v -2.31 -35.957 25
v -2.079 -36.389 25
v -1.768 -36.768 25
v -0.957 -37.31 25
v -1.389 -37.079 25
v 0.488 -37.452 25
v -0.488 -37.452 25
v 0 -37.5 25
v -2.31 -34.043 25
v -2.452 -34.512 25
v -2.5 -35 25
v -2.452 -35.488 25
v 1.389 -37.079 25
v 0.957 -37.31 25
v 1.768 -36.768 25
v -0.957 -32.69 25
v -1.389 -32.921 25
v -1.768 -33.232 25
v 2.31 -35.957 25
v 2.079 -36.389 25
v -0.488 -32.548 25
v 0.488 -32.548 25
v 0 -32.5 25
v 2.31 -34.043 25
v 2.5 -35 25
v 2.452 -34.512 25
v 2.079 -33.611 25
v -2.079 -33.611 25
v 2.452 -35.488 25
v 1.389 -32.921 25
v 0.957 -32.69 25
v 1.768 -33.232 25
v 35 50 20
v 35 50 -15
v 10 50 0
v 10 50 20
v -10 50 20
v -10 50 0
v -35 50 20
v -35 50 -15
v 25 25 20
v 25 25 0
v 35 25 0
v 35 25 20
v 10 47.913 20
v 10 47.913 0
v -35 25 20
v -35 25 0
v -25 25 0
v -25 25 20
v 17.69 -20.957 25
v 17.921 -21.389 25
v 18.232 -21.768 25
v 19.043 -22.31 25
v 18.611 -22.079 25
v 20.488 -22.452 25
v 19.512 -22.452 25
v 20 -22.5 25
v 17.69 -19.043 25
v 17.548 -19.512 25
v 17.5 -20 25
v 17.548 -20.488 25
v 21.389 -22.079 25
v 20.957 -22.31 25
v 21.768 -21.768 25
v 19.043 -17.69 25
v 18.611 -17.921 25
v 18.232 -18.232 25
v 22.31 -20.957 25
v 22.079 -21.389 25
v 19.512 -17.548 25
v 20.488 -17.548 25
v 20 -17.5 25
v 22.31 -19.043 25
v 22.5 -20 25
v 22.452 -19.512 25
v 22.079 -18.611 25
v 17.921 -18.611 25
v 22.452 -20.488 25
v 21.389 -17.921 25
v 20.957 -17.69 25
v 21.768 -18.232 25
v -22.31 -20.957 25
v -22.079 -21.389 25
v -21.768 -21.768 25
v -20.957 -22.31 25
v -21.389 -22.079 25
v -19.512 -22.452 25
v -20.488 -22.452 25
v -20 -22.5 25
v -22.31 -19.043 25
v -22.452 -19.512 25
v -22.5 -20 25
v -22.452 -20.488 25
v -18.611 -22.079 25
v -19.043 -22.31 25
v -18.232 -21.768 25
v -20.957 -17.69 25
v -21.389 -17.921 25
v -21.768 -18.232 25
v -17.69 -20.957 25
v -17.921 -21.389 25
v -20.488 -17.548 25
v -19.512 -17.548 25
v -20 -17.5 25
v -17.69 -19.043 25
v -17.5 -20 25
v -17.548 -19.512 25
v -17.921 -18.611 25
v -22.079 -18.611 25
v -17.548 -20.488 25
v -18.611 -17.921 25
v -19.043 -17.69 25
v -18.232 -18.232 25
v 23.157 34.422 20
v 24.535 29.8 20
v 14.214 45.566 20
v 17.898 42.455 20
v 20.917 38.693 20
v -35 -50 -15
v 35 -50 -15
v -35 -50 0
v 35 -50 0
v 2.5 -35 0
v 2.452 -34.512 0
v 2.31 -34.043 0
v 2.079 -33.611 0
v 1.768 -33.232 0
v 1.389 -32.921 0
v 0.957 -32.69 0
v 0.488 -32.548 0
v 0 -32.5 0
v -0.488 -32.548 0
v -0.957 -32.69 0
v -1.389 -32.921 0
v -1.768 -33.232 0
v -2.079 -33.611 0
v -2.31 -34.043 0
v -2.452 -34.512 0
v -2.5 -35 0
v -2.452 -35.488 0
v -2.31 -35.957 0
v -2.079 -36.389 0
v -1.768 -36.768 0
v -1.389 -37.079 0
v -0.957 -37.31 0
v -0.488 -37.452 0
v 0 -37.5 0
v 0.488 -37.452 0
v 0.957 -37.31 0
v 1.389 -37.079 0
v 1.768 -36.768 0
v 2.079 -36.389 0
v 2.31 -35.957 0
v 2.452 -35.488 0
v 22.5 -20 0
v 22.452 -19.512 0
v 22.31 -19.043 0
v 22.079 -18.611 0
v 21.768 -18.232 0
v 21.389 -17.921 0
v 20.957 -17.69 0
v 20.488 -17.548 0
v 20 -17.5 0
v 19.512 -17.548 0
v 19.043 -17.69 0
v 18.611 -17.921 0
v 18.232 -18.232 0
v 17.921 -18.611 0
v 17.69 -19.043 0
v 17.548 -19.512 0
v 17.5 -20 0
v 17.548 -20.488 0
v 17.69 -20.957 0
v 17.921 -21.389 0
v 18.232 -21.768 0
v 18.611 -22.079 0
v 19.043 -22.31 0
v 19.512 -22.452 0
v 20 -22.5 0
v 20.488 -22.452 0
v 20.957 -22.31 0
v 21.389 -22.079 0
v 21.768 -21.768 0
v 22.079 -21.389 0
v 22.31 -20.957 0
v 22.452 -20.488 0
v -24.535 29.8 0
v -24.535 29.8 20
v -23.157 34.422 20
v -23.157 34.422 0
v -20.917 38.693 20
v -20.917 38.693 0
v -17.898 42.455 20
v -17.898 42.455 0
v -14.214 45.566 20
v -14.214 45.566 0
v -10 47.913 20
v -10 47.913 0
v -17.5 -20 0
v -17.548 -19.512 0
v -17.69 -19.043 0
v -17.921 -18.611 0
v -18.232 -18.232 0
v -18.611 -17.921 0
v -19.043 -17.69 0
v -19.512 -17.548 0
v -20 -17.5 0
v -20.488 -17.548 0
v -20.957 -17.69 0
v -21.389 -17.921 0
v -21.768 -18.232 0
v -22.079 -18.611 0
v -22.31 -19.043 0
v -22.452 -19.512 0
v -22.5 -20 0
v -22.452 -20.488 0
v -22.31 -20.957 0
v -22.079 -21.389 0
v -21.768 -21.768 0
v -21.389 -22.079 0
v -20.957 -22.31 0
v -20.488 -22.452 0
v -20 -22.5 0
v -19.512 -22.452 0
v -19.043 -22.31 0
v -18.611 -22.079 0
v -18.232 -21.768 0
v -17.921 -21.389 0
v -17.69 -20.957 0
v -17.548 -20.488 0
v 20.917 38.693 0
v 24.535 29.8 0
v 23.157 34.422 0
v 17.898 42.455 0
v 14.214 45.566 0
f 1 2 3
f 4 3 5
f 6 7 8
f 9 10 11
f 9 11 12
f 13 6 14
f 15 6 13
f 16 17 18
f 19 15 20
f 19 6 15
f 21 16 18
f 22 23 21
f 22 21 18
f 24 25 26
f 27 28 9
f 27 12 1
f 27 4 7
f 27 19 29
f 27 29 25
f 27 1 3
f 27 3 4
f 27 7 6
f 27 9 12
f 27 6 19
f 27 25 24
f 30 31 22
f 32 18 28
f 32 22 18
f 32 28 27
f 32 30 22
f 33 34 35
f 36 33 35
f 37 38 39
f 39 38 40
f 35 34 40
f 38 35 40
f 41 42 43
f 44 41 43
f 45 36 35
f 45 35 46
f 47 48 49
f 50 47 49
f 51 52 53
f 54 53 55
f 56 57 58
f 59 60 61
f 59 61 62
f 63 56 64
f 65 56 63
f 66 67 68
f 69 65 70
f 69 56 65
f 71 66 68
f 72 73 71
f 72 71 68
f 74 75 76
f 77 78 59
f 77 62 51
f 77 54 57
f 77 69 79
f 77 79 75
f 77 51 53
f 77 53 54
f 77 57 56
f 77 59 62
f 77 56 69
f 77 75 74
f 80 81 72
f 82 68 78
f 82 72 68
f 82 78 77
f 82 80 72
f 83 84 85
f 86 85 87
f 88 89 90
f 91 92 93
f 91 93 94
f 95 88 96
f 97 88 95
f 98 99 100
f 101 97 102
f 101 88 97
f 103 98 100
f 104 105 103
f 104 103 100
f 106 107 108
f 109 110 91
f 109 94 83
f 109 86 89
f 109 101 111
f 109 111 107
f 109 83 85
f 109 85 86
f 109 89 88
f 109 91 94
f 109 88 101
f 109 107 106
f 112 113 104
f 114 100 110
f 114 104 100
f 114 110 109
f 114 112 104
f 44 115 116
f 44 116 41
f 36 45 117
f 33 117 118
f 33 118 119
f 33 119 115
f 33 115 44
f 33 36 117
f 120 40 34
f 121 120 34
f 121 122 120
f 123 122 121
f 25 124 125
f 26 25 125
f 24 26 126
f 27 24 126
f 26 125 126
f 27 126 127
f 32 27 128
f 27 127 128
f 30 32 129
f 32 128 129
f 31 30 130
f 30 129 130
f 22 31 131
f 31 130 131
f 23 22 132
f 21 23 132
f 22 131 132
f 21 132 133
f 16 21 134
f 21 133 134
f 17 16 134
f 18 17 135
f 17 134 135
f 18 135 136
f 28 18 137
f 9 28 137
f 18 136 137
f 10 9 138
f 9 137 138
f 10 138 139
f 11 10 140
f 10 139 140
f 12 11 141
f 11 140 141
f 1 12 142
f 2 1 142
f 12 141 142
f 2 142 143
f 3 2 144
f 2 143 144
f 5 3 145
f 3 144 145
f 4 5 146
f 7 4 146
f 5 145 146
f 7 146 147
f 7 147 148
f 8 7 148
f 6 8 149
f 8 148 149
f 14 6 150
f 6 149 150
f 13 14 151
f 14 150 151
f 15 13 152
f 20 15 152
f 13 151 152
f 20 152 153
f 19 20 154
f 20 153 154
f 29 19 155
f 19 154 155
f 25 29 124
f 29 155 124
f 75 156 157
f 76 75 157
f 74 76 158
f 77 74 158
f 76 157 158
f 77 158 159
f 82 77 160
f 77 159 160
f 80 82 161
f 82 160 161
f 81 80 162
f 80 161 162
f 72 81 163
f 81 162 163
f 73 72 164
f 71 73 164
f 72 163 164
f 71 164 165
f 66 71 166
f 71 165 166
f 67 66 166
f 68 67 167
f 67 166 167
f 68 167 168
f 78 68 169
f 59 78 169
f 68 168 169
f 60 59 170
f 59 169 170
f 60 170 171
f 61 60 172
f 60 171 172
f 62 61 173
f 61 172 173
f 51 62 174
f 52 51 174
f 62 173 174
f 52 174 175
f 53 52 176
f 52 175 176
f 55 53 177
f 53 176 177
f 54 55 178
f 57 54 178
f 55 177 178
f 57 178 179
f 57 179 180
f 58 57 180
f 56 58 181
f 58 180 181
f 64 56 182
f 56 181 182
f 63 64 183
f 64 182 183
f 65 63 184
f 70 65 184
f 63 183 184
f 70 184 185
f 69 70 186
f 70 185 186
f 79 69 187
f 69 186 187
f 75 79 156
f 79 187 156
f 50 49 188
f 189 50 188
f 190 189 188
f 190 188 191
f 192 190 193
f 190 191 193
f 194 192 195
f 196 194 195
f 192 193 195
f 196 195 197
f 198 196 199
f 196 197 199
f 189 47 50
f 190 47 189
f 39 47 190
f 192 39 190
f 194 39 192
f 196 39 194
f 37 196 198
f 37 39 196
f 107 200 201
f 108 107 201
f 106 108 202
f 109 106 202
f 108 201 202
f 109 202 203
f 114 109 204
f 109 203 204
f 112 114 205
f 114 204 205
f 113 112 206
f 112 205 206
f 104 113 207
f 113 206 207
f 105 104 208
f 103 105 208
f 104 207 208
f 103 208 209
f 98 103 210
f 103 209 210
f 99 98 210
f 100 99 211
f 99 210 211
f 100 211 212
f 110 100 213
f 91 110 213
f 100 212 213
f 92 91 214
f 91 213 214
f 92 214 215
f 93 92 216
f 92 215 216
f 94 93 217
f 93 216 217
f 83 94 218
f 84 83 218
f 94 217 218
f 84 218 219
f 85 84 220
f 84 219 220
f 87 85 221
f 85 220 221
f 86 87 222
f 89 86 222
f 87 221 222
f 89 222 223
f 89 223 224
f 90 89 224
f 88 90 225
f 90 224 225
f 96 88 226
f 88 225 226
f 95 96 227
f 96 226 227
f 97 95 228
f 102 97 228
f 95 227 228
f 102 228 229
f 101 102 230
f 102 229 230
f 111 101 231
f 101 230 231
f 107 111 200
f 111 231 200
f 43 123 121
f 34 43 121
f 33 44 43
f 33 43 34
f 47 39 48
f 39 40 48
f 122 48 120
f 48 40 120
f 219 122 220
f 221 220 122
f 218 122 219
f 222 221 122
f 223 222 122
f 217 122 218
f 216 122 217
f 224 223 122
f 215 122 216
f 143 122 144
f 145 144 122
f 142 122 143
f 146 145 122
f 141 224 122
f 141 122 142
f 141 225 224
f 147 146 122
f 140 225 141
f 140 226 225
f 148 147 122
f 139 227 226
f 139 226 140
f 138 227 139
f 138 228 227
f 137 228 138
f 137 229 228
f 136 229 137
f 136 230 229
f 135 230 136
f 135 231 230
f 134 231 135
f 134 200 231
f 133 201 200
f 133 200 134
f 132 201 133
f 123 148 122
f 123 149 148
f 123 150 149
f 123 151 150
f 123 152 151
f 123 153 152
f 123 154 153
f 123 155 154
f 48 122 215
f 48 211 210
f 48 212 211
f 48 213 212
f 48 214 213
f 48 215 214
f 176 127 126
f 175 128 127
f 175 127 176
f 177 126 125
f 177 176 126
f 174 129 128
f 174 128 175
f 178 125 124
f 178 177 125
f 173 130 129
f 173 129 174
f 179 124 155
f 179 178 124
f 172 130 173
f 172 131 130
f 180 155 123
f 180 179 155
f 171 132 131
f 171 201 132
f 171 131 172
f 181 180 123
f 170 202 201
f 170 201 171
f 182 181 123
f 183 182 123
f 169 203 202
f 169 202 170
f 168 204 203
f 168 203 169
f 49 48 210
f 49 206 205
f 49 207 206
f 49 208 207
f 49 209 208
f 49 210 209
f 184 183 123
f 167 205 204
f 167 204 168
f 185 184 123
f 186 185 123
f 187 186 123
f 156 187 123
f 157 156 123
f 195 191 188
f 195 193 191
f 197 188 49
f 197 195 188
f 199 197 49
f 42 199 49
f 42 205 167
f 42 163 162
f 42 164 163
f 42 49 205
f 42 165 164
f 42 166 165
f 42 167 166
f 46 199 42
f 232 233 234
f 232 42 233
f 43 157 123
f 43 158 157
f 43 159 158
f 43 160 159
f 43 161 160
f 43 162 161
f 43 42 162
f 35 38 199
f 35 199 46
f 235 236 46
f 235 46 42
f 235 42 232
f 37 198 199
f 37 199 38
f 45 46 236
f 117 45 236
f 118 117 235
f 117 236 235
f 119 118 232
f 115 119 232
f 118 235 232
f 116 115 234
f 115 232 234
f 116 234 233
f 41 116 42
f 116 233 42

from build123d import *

# Parameters (mm, degrees)
F0_W     = 70
F0_H     = 100
F1_DEPTH = 15
F3_DEPTH = 20
F4_R     = 2.5
F5_DEPTH = 25


with BuildPart() as f1:
    # F0 (on Top) → F1 (new body)
    with BuildSketch(Plane.XY):
        Rectangle(F0_W, F0_H)
    extrude(amount=-F1_DEPTH)

    # F2 (on face) → F3 (join)
    with BuildSketch(Plane.XY):
        with BuildLine():
            Line((-10, 47.912878), (-10, 50))
            Line((-10, 50), (-35, 50))
            Line((-35, 50), (-35, 25))
            Line((-35, 25), (-25, 25))
            ThreePointArc((-25, 25), (-20.916501, 38.693064), (-10, 47.912878))
        make_face()
        with BuildLine():
            ThreePointArc((10, 47.912878), (20.916501, 38.693064), (25, 25))
            Line((25, 25), (35, 25))
            Line((35, 25), (35, 50))
            Line((35, 50), (10, 50))
            Line((10, 50), (10, 47.912878))
        make_face()
    extrude(amount=F3_DEPTH)

    # F4 (on face) → F5 (join)
    with BuildSketch(Plane.XY):
        with Locations((-20, -20)):
            Circle(F4_R)
        with Locations((0, -35)):
            Circle(F4_R)
        with Locations((20, -20)):
            Circle(F4_R)
    extrude(amount=F5_DEPTH)


solid = f1.part
